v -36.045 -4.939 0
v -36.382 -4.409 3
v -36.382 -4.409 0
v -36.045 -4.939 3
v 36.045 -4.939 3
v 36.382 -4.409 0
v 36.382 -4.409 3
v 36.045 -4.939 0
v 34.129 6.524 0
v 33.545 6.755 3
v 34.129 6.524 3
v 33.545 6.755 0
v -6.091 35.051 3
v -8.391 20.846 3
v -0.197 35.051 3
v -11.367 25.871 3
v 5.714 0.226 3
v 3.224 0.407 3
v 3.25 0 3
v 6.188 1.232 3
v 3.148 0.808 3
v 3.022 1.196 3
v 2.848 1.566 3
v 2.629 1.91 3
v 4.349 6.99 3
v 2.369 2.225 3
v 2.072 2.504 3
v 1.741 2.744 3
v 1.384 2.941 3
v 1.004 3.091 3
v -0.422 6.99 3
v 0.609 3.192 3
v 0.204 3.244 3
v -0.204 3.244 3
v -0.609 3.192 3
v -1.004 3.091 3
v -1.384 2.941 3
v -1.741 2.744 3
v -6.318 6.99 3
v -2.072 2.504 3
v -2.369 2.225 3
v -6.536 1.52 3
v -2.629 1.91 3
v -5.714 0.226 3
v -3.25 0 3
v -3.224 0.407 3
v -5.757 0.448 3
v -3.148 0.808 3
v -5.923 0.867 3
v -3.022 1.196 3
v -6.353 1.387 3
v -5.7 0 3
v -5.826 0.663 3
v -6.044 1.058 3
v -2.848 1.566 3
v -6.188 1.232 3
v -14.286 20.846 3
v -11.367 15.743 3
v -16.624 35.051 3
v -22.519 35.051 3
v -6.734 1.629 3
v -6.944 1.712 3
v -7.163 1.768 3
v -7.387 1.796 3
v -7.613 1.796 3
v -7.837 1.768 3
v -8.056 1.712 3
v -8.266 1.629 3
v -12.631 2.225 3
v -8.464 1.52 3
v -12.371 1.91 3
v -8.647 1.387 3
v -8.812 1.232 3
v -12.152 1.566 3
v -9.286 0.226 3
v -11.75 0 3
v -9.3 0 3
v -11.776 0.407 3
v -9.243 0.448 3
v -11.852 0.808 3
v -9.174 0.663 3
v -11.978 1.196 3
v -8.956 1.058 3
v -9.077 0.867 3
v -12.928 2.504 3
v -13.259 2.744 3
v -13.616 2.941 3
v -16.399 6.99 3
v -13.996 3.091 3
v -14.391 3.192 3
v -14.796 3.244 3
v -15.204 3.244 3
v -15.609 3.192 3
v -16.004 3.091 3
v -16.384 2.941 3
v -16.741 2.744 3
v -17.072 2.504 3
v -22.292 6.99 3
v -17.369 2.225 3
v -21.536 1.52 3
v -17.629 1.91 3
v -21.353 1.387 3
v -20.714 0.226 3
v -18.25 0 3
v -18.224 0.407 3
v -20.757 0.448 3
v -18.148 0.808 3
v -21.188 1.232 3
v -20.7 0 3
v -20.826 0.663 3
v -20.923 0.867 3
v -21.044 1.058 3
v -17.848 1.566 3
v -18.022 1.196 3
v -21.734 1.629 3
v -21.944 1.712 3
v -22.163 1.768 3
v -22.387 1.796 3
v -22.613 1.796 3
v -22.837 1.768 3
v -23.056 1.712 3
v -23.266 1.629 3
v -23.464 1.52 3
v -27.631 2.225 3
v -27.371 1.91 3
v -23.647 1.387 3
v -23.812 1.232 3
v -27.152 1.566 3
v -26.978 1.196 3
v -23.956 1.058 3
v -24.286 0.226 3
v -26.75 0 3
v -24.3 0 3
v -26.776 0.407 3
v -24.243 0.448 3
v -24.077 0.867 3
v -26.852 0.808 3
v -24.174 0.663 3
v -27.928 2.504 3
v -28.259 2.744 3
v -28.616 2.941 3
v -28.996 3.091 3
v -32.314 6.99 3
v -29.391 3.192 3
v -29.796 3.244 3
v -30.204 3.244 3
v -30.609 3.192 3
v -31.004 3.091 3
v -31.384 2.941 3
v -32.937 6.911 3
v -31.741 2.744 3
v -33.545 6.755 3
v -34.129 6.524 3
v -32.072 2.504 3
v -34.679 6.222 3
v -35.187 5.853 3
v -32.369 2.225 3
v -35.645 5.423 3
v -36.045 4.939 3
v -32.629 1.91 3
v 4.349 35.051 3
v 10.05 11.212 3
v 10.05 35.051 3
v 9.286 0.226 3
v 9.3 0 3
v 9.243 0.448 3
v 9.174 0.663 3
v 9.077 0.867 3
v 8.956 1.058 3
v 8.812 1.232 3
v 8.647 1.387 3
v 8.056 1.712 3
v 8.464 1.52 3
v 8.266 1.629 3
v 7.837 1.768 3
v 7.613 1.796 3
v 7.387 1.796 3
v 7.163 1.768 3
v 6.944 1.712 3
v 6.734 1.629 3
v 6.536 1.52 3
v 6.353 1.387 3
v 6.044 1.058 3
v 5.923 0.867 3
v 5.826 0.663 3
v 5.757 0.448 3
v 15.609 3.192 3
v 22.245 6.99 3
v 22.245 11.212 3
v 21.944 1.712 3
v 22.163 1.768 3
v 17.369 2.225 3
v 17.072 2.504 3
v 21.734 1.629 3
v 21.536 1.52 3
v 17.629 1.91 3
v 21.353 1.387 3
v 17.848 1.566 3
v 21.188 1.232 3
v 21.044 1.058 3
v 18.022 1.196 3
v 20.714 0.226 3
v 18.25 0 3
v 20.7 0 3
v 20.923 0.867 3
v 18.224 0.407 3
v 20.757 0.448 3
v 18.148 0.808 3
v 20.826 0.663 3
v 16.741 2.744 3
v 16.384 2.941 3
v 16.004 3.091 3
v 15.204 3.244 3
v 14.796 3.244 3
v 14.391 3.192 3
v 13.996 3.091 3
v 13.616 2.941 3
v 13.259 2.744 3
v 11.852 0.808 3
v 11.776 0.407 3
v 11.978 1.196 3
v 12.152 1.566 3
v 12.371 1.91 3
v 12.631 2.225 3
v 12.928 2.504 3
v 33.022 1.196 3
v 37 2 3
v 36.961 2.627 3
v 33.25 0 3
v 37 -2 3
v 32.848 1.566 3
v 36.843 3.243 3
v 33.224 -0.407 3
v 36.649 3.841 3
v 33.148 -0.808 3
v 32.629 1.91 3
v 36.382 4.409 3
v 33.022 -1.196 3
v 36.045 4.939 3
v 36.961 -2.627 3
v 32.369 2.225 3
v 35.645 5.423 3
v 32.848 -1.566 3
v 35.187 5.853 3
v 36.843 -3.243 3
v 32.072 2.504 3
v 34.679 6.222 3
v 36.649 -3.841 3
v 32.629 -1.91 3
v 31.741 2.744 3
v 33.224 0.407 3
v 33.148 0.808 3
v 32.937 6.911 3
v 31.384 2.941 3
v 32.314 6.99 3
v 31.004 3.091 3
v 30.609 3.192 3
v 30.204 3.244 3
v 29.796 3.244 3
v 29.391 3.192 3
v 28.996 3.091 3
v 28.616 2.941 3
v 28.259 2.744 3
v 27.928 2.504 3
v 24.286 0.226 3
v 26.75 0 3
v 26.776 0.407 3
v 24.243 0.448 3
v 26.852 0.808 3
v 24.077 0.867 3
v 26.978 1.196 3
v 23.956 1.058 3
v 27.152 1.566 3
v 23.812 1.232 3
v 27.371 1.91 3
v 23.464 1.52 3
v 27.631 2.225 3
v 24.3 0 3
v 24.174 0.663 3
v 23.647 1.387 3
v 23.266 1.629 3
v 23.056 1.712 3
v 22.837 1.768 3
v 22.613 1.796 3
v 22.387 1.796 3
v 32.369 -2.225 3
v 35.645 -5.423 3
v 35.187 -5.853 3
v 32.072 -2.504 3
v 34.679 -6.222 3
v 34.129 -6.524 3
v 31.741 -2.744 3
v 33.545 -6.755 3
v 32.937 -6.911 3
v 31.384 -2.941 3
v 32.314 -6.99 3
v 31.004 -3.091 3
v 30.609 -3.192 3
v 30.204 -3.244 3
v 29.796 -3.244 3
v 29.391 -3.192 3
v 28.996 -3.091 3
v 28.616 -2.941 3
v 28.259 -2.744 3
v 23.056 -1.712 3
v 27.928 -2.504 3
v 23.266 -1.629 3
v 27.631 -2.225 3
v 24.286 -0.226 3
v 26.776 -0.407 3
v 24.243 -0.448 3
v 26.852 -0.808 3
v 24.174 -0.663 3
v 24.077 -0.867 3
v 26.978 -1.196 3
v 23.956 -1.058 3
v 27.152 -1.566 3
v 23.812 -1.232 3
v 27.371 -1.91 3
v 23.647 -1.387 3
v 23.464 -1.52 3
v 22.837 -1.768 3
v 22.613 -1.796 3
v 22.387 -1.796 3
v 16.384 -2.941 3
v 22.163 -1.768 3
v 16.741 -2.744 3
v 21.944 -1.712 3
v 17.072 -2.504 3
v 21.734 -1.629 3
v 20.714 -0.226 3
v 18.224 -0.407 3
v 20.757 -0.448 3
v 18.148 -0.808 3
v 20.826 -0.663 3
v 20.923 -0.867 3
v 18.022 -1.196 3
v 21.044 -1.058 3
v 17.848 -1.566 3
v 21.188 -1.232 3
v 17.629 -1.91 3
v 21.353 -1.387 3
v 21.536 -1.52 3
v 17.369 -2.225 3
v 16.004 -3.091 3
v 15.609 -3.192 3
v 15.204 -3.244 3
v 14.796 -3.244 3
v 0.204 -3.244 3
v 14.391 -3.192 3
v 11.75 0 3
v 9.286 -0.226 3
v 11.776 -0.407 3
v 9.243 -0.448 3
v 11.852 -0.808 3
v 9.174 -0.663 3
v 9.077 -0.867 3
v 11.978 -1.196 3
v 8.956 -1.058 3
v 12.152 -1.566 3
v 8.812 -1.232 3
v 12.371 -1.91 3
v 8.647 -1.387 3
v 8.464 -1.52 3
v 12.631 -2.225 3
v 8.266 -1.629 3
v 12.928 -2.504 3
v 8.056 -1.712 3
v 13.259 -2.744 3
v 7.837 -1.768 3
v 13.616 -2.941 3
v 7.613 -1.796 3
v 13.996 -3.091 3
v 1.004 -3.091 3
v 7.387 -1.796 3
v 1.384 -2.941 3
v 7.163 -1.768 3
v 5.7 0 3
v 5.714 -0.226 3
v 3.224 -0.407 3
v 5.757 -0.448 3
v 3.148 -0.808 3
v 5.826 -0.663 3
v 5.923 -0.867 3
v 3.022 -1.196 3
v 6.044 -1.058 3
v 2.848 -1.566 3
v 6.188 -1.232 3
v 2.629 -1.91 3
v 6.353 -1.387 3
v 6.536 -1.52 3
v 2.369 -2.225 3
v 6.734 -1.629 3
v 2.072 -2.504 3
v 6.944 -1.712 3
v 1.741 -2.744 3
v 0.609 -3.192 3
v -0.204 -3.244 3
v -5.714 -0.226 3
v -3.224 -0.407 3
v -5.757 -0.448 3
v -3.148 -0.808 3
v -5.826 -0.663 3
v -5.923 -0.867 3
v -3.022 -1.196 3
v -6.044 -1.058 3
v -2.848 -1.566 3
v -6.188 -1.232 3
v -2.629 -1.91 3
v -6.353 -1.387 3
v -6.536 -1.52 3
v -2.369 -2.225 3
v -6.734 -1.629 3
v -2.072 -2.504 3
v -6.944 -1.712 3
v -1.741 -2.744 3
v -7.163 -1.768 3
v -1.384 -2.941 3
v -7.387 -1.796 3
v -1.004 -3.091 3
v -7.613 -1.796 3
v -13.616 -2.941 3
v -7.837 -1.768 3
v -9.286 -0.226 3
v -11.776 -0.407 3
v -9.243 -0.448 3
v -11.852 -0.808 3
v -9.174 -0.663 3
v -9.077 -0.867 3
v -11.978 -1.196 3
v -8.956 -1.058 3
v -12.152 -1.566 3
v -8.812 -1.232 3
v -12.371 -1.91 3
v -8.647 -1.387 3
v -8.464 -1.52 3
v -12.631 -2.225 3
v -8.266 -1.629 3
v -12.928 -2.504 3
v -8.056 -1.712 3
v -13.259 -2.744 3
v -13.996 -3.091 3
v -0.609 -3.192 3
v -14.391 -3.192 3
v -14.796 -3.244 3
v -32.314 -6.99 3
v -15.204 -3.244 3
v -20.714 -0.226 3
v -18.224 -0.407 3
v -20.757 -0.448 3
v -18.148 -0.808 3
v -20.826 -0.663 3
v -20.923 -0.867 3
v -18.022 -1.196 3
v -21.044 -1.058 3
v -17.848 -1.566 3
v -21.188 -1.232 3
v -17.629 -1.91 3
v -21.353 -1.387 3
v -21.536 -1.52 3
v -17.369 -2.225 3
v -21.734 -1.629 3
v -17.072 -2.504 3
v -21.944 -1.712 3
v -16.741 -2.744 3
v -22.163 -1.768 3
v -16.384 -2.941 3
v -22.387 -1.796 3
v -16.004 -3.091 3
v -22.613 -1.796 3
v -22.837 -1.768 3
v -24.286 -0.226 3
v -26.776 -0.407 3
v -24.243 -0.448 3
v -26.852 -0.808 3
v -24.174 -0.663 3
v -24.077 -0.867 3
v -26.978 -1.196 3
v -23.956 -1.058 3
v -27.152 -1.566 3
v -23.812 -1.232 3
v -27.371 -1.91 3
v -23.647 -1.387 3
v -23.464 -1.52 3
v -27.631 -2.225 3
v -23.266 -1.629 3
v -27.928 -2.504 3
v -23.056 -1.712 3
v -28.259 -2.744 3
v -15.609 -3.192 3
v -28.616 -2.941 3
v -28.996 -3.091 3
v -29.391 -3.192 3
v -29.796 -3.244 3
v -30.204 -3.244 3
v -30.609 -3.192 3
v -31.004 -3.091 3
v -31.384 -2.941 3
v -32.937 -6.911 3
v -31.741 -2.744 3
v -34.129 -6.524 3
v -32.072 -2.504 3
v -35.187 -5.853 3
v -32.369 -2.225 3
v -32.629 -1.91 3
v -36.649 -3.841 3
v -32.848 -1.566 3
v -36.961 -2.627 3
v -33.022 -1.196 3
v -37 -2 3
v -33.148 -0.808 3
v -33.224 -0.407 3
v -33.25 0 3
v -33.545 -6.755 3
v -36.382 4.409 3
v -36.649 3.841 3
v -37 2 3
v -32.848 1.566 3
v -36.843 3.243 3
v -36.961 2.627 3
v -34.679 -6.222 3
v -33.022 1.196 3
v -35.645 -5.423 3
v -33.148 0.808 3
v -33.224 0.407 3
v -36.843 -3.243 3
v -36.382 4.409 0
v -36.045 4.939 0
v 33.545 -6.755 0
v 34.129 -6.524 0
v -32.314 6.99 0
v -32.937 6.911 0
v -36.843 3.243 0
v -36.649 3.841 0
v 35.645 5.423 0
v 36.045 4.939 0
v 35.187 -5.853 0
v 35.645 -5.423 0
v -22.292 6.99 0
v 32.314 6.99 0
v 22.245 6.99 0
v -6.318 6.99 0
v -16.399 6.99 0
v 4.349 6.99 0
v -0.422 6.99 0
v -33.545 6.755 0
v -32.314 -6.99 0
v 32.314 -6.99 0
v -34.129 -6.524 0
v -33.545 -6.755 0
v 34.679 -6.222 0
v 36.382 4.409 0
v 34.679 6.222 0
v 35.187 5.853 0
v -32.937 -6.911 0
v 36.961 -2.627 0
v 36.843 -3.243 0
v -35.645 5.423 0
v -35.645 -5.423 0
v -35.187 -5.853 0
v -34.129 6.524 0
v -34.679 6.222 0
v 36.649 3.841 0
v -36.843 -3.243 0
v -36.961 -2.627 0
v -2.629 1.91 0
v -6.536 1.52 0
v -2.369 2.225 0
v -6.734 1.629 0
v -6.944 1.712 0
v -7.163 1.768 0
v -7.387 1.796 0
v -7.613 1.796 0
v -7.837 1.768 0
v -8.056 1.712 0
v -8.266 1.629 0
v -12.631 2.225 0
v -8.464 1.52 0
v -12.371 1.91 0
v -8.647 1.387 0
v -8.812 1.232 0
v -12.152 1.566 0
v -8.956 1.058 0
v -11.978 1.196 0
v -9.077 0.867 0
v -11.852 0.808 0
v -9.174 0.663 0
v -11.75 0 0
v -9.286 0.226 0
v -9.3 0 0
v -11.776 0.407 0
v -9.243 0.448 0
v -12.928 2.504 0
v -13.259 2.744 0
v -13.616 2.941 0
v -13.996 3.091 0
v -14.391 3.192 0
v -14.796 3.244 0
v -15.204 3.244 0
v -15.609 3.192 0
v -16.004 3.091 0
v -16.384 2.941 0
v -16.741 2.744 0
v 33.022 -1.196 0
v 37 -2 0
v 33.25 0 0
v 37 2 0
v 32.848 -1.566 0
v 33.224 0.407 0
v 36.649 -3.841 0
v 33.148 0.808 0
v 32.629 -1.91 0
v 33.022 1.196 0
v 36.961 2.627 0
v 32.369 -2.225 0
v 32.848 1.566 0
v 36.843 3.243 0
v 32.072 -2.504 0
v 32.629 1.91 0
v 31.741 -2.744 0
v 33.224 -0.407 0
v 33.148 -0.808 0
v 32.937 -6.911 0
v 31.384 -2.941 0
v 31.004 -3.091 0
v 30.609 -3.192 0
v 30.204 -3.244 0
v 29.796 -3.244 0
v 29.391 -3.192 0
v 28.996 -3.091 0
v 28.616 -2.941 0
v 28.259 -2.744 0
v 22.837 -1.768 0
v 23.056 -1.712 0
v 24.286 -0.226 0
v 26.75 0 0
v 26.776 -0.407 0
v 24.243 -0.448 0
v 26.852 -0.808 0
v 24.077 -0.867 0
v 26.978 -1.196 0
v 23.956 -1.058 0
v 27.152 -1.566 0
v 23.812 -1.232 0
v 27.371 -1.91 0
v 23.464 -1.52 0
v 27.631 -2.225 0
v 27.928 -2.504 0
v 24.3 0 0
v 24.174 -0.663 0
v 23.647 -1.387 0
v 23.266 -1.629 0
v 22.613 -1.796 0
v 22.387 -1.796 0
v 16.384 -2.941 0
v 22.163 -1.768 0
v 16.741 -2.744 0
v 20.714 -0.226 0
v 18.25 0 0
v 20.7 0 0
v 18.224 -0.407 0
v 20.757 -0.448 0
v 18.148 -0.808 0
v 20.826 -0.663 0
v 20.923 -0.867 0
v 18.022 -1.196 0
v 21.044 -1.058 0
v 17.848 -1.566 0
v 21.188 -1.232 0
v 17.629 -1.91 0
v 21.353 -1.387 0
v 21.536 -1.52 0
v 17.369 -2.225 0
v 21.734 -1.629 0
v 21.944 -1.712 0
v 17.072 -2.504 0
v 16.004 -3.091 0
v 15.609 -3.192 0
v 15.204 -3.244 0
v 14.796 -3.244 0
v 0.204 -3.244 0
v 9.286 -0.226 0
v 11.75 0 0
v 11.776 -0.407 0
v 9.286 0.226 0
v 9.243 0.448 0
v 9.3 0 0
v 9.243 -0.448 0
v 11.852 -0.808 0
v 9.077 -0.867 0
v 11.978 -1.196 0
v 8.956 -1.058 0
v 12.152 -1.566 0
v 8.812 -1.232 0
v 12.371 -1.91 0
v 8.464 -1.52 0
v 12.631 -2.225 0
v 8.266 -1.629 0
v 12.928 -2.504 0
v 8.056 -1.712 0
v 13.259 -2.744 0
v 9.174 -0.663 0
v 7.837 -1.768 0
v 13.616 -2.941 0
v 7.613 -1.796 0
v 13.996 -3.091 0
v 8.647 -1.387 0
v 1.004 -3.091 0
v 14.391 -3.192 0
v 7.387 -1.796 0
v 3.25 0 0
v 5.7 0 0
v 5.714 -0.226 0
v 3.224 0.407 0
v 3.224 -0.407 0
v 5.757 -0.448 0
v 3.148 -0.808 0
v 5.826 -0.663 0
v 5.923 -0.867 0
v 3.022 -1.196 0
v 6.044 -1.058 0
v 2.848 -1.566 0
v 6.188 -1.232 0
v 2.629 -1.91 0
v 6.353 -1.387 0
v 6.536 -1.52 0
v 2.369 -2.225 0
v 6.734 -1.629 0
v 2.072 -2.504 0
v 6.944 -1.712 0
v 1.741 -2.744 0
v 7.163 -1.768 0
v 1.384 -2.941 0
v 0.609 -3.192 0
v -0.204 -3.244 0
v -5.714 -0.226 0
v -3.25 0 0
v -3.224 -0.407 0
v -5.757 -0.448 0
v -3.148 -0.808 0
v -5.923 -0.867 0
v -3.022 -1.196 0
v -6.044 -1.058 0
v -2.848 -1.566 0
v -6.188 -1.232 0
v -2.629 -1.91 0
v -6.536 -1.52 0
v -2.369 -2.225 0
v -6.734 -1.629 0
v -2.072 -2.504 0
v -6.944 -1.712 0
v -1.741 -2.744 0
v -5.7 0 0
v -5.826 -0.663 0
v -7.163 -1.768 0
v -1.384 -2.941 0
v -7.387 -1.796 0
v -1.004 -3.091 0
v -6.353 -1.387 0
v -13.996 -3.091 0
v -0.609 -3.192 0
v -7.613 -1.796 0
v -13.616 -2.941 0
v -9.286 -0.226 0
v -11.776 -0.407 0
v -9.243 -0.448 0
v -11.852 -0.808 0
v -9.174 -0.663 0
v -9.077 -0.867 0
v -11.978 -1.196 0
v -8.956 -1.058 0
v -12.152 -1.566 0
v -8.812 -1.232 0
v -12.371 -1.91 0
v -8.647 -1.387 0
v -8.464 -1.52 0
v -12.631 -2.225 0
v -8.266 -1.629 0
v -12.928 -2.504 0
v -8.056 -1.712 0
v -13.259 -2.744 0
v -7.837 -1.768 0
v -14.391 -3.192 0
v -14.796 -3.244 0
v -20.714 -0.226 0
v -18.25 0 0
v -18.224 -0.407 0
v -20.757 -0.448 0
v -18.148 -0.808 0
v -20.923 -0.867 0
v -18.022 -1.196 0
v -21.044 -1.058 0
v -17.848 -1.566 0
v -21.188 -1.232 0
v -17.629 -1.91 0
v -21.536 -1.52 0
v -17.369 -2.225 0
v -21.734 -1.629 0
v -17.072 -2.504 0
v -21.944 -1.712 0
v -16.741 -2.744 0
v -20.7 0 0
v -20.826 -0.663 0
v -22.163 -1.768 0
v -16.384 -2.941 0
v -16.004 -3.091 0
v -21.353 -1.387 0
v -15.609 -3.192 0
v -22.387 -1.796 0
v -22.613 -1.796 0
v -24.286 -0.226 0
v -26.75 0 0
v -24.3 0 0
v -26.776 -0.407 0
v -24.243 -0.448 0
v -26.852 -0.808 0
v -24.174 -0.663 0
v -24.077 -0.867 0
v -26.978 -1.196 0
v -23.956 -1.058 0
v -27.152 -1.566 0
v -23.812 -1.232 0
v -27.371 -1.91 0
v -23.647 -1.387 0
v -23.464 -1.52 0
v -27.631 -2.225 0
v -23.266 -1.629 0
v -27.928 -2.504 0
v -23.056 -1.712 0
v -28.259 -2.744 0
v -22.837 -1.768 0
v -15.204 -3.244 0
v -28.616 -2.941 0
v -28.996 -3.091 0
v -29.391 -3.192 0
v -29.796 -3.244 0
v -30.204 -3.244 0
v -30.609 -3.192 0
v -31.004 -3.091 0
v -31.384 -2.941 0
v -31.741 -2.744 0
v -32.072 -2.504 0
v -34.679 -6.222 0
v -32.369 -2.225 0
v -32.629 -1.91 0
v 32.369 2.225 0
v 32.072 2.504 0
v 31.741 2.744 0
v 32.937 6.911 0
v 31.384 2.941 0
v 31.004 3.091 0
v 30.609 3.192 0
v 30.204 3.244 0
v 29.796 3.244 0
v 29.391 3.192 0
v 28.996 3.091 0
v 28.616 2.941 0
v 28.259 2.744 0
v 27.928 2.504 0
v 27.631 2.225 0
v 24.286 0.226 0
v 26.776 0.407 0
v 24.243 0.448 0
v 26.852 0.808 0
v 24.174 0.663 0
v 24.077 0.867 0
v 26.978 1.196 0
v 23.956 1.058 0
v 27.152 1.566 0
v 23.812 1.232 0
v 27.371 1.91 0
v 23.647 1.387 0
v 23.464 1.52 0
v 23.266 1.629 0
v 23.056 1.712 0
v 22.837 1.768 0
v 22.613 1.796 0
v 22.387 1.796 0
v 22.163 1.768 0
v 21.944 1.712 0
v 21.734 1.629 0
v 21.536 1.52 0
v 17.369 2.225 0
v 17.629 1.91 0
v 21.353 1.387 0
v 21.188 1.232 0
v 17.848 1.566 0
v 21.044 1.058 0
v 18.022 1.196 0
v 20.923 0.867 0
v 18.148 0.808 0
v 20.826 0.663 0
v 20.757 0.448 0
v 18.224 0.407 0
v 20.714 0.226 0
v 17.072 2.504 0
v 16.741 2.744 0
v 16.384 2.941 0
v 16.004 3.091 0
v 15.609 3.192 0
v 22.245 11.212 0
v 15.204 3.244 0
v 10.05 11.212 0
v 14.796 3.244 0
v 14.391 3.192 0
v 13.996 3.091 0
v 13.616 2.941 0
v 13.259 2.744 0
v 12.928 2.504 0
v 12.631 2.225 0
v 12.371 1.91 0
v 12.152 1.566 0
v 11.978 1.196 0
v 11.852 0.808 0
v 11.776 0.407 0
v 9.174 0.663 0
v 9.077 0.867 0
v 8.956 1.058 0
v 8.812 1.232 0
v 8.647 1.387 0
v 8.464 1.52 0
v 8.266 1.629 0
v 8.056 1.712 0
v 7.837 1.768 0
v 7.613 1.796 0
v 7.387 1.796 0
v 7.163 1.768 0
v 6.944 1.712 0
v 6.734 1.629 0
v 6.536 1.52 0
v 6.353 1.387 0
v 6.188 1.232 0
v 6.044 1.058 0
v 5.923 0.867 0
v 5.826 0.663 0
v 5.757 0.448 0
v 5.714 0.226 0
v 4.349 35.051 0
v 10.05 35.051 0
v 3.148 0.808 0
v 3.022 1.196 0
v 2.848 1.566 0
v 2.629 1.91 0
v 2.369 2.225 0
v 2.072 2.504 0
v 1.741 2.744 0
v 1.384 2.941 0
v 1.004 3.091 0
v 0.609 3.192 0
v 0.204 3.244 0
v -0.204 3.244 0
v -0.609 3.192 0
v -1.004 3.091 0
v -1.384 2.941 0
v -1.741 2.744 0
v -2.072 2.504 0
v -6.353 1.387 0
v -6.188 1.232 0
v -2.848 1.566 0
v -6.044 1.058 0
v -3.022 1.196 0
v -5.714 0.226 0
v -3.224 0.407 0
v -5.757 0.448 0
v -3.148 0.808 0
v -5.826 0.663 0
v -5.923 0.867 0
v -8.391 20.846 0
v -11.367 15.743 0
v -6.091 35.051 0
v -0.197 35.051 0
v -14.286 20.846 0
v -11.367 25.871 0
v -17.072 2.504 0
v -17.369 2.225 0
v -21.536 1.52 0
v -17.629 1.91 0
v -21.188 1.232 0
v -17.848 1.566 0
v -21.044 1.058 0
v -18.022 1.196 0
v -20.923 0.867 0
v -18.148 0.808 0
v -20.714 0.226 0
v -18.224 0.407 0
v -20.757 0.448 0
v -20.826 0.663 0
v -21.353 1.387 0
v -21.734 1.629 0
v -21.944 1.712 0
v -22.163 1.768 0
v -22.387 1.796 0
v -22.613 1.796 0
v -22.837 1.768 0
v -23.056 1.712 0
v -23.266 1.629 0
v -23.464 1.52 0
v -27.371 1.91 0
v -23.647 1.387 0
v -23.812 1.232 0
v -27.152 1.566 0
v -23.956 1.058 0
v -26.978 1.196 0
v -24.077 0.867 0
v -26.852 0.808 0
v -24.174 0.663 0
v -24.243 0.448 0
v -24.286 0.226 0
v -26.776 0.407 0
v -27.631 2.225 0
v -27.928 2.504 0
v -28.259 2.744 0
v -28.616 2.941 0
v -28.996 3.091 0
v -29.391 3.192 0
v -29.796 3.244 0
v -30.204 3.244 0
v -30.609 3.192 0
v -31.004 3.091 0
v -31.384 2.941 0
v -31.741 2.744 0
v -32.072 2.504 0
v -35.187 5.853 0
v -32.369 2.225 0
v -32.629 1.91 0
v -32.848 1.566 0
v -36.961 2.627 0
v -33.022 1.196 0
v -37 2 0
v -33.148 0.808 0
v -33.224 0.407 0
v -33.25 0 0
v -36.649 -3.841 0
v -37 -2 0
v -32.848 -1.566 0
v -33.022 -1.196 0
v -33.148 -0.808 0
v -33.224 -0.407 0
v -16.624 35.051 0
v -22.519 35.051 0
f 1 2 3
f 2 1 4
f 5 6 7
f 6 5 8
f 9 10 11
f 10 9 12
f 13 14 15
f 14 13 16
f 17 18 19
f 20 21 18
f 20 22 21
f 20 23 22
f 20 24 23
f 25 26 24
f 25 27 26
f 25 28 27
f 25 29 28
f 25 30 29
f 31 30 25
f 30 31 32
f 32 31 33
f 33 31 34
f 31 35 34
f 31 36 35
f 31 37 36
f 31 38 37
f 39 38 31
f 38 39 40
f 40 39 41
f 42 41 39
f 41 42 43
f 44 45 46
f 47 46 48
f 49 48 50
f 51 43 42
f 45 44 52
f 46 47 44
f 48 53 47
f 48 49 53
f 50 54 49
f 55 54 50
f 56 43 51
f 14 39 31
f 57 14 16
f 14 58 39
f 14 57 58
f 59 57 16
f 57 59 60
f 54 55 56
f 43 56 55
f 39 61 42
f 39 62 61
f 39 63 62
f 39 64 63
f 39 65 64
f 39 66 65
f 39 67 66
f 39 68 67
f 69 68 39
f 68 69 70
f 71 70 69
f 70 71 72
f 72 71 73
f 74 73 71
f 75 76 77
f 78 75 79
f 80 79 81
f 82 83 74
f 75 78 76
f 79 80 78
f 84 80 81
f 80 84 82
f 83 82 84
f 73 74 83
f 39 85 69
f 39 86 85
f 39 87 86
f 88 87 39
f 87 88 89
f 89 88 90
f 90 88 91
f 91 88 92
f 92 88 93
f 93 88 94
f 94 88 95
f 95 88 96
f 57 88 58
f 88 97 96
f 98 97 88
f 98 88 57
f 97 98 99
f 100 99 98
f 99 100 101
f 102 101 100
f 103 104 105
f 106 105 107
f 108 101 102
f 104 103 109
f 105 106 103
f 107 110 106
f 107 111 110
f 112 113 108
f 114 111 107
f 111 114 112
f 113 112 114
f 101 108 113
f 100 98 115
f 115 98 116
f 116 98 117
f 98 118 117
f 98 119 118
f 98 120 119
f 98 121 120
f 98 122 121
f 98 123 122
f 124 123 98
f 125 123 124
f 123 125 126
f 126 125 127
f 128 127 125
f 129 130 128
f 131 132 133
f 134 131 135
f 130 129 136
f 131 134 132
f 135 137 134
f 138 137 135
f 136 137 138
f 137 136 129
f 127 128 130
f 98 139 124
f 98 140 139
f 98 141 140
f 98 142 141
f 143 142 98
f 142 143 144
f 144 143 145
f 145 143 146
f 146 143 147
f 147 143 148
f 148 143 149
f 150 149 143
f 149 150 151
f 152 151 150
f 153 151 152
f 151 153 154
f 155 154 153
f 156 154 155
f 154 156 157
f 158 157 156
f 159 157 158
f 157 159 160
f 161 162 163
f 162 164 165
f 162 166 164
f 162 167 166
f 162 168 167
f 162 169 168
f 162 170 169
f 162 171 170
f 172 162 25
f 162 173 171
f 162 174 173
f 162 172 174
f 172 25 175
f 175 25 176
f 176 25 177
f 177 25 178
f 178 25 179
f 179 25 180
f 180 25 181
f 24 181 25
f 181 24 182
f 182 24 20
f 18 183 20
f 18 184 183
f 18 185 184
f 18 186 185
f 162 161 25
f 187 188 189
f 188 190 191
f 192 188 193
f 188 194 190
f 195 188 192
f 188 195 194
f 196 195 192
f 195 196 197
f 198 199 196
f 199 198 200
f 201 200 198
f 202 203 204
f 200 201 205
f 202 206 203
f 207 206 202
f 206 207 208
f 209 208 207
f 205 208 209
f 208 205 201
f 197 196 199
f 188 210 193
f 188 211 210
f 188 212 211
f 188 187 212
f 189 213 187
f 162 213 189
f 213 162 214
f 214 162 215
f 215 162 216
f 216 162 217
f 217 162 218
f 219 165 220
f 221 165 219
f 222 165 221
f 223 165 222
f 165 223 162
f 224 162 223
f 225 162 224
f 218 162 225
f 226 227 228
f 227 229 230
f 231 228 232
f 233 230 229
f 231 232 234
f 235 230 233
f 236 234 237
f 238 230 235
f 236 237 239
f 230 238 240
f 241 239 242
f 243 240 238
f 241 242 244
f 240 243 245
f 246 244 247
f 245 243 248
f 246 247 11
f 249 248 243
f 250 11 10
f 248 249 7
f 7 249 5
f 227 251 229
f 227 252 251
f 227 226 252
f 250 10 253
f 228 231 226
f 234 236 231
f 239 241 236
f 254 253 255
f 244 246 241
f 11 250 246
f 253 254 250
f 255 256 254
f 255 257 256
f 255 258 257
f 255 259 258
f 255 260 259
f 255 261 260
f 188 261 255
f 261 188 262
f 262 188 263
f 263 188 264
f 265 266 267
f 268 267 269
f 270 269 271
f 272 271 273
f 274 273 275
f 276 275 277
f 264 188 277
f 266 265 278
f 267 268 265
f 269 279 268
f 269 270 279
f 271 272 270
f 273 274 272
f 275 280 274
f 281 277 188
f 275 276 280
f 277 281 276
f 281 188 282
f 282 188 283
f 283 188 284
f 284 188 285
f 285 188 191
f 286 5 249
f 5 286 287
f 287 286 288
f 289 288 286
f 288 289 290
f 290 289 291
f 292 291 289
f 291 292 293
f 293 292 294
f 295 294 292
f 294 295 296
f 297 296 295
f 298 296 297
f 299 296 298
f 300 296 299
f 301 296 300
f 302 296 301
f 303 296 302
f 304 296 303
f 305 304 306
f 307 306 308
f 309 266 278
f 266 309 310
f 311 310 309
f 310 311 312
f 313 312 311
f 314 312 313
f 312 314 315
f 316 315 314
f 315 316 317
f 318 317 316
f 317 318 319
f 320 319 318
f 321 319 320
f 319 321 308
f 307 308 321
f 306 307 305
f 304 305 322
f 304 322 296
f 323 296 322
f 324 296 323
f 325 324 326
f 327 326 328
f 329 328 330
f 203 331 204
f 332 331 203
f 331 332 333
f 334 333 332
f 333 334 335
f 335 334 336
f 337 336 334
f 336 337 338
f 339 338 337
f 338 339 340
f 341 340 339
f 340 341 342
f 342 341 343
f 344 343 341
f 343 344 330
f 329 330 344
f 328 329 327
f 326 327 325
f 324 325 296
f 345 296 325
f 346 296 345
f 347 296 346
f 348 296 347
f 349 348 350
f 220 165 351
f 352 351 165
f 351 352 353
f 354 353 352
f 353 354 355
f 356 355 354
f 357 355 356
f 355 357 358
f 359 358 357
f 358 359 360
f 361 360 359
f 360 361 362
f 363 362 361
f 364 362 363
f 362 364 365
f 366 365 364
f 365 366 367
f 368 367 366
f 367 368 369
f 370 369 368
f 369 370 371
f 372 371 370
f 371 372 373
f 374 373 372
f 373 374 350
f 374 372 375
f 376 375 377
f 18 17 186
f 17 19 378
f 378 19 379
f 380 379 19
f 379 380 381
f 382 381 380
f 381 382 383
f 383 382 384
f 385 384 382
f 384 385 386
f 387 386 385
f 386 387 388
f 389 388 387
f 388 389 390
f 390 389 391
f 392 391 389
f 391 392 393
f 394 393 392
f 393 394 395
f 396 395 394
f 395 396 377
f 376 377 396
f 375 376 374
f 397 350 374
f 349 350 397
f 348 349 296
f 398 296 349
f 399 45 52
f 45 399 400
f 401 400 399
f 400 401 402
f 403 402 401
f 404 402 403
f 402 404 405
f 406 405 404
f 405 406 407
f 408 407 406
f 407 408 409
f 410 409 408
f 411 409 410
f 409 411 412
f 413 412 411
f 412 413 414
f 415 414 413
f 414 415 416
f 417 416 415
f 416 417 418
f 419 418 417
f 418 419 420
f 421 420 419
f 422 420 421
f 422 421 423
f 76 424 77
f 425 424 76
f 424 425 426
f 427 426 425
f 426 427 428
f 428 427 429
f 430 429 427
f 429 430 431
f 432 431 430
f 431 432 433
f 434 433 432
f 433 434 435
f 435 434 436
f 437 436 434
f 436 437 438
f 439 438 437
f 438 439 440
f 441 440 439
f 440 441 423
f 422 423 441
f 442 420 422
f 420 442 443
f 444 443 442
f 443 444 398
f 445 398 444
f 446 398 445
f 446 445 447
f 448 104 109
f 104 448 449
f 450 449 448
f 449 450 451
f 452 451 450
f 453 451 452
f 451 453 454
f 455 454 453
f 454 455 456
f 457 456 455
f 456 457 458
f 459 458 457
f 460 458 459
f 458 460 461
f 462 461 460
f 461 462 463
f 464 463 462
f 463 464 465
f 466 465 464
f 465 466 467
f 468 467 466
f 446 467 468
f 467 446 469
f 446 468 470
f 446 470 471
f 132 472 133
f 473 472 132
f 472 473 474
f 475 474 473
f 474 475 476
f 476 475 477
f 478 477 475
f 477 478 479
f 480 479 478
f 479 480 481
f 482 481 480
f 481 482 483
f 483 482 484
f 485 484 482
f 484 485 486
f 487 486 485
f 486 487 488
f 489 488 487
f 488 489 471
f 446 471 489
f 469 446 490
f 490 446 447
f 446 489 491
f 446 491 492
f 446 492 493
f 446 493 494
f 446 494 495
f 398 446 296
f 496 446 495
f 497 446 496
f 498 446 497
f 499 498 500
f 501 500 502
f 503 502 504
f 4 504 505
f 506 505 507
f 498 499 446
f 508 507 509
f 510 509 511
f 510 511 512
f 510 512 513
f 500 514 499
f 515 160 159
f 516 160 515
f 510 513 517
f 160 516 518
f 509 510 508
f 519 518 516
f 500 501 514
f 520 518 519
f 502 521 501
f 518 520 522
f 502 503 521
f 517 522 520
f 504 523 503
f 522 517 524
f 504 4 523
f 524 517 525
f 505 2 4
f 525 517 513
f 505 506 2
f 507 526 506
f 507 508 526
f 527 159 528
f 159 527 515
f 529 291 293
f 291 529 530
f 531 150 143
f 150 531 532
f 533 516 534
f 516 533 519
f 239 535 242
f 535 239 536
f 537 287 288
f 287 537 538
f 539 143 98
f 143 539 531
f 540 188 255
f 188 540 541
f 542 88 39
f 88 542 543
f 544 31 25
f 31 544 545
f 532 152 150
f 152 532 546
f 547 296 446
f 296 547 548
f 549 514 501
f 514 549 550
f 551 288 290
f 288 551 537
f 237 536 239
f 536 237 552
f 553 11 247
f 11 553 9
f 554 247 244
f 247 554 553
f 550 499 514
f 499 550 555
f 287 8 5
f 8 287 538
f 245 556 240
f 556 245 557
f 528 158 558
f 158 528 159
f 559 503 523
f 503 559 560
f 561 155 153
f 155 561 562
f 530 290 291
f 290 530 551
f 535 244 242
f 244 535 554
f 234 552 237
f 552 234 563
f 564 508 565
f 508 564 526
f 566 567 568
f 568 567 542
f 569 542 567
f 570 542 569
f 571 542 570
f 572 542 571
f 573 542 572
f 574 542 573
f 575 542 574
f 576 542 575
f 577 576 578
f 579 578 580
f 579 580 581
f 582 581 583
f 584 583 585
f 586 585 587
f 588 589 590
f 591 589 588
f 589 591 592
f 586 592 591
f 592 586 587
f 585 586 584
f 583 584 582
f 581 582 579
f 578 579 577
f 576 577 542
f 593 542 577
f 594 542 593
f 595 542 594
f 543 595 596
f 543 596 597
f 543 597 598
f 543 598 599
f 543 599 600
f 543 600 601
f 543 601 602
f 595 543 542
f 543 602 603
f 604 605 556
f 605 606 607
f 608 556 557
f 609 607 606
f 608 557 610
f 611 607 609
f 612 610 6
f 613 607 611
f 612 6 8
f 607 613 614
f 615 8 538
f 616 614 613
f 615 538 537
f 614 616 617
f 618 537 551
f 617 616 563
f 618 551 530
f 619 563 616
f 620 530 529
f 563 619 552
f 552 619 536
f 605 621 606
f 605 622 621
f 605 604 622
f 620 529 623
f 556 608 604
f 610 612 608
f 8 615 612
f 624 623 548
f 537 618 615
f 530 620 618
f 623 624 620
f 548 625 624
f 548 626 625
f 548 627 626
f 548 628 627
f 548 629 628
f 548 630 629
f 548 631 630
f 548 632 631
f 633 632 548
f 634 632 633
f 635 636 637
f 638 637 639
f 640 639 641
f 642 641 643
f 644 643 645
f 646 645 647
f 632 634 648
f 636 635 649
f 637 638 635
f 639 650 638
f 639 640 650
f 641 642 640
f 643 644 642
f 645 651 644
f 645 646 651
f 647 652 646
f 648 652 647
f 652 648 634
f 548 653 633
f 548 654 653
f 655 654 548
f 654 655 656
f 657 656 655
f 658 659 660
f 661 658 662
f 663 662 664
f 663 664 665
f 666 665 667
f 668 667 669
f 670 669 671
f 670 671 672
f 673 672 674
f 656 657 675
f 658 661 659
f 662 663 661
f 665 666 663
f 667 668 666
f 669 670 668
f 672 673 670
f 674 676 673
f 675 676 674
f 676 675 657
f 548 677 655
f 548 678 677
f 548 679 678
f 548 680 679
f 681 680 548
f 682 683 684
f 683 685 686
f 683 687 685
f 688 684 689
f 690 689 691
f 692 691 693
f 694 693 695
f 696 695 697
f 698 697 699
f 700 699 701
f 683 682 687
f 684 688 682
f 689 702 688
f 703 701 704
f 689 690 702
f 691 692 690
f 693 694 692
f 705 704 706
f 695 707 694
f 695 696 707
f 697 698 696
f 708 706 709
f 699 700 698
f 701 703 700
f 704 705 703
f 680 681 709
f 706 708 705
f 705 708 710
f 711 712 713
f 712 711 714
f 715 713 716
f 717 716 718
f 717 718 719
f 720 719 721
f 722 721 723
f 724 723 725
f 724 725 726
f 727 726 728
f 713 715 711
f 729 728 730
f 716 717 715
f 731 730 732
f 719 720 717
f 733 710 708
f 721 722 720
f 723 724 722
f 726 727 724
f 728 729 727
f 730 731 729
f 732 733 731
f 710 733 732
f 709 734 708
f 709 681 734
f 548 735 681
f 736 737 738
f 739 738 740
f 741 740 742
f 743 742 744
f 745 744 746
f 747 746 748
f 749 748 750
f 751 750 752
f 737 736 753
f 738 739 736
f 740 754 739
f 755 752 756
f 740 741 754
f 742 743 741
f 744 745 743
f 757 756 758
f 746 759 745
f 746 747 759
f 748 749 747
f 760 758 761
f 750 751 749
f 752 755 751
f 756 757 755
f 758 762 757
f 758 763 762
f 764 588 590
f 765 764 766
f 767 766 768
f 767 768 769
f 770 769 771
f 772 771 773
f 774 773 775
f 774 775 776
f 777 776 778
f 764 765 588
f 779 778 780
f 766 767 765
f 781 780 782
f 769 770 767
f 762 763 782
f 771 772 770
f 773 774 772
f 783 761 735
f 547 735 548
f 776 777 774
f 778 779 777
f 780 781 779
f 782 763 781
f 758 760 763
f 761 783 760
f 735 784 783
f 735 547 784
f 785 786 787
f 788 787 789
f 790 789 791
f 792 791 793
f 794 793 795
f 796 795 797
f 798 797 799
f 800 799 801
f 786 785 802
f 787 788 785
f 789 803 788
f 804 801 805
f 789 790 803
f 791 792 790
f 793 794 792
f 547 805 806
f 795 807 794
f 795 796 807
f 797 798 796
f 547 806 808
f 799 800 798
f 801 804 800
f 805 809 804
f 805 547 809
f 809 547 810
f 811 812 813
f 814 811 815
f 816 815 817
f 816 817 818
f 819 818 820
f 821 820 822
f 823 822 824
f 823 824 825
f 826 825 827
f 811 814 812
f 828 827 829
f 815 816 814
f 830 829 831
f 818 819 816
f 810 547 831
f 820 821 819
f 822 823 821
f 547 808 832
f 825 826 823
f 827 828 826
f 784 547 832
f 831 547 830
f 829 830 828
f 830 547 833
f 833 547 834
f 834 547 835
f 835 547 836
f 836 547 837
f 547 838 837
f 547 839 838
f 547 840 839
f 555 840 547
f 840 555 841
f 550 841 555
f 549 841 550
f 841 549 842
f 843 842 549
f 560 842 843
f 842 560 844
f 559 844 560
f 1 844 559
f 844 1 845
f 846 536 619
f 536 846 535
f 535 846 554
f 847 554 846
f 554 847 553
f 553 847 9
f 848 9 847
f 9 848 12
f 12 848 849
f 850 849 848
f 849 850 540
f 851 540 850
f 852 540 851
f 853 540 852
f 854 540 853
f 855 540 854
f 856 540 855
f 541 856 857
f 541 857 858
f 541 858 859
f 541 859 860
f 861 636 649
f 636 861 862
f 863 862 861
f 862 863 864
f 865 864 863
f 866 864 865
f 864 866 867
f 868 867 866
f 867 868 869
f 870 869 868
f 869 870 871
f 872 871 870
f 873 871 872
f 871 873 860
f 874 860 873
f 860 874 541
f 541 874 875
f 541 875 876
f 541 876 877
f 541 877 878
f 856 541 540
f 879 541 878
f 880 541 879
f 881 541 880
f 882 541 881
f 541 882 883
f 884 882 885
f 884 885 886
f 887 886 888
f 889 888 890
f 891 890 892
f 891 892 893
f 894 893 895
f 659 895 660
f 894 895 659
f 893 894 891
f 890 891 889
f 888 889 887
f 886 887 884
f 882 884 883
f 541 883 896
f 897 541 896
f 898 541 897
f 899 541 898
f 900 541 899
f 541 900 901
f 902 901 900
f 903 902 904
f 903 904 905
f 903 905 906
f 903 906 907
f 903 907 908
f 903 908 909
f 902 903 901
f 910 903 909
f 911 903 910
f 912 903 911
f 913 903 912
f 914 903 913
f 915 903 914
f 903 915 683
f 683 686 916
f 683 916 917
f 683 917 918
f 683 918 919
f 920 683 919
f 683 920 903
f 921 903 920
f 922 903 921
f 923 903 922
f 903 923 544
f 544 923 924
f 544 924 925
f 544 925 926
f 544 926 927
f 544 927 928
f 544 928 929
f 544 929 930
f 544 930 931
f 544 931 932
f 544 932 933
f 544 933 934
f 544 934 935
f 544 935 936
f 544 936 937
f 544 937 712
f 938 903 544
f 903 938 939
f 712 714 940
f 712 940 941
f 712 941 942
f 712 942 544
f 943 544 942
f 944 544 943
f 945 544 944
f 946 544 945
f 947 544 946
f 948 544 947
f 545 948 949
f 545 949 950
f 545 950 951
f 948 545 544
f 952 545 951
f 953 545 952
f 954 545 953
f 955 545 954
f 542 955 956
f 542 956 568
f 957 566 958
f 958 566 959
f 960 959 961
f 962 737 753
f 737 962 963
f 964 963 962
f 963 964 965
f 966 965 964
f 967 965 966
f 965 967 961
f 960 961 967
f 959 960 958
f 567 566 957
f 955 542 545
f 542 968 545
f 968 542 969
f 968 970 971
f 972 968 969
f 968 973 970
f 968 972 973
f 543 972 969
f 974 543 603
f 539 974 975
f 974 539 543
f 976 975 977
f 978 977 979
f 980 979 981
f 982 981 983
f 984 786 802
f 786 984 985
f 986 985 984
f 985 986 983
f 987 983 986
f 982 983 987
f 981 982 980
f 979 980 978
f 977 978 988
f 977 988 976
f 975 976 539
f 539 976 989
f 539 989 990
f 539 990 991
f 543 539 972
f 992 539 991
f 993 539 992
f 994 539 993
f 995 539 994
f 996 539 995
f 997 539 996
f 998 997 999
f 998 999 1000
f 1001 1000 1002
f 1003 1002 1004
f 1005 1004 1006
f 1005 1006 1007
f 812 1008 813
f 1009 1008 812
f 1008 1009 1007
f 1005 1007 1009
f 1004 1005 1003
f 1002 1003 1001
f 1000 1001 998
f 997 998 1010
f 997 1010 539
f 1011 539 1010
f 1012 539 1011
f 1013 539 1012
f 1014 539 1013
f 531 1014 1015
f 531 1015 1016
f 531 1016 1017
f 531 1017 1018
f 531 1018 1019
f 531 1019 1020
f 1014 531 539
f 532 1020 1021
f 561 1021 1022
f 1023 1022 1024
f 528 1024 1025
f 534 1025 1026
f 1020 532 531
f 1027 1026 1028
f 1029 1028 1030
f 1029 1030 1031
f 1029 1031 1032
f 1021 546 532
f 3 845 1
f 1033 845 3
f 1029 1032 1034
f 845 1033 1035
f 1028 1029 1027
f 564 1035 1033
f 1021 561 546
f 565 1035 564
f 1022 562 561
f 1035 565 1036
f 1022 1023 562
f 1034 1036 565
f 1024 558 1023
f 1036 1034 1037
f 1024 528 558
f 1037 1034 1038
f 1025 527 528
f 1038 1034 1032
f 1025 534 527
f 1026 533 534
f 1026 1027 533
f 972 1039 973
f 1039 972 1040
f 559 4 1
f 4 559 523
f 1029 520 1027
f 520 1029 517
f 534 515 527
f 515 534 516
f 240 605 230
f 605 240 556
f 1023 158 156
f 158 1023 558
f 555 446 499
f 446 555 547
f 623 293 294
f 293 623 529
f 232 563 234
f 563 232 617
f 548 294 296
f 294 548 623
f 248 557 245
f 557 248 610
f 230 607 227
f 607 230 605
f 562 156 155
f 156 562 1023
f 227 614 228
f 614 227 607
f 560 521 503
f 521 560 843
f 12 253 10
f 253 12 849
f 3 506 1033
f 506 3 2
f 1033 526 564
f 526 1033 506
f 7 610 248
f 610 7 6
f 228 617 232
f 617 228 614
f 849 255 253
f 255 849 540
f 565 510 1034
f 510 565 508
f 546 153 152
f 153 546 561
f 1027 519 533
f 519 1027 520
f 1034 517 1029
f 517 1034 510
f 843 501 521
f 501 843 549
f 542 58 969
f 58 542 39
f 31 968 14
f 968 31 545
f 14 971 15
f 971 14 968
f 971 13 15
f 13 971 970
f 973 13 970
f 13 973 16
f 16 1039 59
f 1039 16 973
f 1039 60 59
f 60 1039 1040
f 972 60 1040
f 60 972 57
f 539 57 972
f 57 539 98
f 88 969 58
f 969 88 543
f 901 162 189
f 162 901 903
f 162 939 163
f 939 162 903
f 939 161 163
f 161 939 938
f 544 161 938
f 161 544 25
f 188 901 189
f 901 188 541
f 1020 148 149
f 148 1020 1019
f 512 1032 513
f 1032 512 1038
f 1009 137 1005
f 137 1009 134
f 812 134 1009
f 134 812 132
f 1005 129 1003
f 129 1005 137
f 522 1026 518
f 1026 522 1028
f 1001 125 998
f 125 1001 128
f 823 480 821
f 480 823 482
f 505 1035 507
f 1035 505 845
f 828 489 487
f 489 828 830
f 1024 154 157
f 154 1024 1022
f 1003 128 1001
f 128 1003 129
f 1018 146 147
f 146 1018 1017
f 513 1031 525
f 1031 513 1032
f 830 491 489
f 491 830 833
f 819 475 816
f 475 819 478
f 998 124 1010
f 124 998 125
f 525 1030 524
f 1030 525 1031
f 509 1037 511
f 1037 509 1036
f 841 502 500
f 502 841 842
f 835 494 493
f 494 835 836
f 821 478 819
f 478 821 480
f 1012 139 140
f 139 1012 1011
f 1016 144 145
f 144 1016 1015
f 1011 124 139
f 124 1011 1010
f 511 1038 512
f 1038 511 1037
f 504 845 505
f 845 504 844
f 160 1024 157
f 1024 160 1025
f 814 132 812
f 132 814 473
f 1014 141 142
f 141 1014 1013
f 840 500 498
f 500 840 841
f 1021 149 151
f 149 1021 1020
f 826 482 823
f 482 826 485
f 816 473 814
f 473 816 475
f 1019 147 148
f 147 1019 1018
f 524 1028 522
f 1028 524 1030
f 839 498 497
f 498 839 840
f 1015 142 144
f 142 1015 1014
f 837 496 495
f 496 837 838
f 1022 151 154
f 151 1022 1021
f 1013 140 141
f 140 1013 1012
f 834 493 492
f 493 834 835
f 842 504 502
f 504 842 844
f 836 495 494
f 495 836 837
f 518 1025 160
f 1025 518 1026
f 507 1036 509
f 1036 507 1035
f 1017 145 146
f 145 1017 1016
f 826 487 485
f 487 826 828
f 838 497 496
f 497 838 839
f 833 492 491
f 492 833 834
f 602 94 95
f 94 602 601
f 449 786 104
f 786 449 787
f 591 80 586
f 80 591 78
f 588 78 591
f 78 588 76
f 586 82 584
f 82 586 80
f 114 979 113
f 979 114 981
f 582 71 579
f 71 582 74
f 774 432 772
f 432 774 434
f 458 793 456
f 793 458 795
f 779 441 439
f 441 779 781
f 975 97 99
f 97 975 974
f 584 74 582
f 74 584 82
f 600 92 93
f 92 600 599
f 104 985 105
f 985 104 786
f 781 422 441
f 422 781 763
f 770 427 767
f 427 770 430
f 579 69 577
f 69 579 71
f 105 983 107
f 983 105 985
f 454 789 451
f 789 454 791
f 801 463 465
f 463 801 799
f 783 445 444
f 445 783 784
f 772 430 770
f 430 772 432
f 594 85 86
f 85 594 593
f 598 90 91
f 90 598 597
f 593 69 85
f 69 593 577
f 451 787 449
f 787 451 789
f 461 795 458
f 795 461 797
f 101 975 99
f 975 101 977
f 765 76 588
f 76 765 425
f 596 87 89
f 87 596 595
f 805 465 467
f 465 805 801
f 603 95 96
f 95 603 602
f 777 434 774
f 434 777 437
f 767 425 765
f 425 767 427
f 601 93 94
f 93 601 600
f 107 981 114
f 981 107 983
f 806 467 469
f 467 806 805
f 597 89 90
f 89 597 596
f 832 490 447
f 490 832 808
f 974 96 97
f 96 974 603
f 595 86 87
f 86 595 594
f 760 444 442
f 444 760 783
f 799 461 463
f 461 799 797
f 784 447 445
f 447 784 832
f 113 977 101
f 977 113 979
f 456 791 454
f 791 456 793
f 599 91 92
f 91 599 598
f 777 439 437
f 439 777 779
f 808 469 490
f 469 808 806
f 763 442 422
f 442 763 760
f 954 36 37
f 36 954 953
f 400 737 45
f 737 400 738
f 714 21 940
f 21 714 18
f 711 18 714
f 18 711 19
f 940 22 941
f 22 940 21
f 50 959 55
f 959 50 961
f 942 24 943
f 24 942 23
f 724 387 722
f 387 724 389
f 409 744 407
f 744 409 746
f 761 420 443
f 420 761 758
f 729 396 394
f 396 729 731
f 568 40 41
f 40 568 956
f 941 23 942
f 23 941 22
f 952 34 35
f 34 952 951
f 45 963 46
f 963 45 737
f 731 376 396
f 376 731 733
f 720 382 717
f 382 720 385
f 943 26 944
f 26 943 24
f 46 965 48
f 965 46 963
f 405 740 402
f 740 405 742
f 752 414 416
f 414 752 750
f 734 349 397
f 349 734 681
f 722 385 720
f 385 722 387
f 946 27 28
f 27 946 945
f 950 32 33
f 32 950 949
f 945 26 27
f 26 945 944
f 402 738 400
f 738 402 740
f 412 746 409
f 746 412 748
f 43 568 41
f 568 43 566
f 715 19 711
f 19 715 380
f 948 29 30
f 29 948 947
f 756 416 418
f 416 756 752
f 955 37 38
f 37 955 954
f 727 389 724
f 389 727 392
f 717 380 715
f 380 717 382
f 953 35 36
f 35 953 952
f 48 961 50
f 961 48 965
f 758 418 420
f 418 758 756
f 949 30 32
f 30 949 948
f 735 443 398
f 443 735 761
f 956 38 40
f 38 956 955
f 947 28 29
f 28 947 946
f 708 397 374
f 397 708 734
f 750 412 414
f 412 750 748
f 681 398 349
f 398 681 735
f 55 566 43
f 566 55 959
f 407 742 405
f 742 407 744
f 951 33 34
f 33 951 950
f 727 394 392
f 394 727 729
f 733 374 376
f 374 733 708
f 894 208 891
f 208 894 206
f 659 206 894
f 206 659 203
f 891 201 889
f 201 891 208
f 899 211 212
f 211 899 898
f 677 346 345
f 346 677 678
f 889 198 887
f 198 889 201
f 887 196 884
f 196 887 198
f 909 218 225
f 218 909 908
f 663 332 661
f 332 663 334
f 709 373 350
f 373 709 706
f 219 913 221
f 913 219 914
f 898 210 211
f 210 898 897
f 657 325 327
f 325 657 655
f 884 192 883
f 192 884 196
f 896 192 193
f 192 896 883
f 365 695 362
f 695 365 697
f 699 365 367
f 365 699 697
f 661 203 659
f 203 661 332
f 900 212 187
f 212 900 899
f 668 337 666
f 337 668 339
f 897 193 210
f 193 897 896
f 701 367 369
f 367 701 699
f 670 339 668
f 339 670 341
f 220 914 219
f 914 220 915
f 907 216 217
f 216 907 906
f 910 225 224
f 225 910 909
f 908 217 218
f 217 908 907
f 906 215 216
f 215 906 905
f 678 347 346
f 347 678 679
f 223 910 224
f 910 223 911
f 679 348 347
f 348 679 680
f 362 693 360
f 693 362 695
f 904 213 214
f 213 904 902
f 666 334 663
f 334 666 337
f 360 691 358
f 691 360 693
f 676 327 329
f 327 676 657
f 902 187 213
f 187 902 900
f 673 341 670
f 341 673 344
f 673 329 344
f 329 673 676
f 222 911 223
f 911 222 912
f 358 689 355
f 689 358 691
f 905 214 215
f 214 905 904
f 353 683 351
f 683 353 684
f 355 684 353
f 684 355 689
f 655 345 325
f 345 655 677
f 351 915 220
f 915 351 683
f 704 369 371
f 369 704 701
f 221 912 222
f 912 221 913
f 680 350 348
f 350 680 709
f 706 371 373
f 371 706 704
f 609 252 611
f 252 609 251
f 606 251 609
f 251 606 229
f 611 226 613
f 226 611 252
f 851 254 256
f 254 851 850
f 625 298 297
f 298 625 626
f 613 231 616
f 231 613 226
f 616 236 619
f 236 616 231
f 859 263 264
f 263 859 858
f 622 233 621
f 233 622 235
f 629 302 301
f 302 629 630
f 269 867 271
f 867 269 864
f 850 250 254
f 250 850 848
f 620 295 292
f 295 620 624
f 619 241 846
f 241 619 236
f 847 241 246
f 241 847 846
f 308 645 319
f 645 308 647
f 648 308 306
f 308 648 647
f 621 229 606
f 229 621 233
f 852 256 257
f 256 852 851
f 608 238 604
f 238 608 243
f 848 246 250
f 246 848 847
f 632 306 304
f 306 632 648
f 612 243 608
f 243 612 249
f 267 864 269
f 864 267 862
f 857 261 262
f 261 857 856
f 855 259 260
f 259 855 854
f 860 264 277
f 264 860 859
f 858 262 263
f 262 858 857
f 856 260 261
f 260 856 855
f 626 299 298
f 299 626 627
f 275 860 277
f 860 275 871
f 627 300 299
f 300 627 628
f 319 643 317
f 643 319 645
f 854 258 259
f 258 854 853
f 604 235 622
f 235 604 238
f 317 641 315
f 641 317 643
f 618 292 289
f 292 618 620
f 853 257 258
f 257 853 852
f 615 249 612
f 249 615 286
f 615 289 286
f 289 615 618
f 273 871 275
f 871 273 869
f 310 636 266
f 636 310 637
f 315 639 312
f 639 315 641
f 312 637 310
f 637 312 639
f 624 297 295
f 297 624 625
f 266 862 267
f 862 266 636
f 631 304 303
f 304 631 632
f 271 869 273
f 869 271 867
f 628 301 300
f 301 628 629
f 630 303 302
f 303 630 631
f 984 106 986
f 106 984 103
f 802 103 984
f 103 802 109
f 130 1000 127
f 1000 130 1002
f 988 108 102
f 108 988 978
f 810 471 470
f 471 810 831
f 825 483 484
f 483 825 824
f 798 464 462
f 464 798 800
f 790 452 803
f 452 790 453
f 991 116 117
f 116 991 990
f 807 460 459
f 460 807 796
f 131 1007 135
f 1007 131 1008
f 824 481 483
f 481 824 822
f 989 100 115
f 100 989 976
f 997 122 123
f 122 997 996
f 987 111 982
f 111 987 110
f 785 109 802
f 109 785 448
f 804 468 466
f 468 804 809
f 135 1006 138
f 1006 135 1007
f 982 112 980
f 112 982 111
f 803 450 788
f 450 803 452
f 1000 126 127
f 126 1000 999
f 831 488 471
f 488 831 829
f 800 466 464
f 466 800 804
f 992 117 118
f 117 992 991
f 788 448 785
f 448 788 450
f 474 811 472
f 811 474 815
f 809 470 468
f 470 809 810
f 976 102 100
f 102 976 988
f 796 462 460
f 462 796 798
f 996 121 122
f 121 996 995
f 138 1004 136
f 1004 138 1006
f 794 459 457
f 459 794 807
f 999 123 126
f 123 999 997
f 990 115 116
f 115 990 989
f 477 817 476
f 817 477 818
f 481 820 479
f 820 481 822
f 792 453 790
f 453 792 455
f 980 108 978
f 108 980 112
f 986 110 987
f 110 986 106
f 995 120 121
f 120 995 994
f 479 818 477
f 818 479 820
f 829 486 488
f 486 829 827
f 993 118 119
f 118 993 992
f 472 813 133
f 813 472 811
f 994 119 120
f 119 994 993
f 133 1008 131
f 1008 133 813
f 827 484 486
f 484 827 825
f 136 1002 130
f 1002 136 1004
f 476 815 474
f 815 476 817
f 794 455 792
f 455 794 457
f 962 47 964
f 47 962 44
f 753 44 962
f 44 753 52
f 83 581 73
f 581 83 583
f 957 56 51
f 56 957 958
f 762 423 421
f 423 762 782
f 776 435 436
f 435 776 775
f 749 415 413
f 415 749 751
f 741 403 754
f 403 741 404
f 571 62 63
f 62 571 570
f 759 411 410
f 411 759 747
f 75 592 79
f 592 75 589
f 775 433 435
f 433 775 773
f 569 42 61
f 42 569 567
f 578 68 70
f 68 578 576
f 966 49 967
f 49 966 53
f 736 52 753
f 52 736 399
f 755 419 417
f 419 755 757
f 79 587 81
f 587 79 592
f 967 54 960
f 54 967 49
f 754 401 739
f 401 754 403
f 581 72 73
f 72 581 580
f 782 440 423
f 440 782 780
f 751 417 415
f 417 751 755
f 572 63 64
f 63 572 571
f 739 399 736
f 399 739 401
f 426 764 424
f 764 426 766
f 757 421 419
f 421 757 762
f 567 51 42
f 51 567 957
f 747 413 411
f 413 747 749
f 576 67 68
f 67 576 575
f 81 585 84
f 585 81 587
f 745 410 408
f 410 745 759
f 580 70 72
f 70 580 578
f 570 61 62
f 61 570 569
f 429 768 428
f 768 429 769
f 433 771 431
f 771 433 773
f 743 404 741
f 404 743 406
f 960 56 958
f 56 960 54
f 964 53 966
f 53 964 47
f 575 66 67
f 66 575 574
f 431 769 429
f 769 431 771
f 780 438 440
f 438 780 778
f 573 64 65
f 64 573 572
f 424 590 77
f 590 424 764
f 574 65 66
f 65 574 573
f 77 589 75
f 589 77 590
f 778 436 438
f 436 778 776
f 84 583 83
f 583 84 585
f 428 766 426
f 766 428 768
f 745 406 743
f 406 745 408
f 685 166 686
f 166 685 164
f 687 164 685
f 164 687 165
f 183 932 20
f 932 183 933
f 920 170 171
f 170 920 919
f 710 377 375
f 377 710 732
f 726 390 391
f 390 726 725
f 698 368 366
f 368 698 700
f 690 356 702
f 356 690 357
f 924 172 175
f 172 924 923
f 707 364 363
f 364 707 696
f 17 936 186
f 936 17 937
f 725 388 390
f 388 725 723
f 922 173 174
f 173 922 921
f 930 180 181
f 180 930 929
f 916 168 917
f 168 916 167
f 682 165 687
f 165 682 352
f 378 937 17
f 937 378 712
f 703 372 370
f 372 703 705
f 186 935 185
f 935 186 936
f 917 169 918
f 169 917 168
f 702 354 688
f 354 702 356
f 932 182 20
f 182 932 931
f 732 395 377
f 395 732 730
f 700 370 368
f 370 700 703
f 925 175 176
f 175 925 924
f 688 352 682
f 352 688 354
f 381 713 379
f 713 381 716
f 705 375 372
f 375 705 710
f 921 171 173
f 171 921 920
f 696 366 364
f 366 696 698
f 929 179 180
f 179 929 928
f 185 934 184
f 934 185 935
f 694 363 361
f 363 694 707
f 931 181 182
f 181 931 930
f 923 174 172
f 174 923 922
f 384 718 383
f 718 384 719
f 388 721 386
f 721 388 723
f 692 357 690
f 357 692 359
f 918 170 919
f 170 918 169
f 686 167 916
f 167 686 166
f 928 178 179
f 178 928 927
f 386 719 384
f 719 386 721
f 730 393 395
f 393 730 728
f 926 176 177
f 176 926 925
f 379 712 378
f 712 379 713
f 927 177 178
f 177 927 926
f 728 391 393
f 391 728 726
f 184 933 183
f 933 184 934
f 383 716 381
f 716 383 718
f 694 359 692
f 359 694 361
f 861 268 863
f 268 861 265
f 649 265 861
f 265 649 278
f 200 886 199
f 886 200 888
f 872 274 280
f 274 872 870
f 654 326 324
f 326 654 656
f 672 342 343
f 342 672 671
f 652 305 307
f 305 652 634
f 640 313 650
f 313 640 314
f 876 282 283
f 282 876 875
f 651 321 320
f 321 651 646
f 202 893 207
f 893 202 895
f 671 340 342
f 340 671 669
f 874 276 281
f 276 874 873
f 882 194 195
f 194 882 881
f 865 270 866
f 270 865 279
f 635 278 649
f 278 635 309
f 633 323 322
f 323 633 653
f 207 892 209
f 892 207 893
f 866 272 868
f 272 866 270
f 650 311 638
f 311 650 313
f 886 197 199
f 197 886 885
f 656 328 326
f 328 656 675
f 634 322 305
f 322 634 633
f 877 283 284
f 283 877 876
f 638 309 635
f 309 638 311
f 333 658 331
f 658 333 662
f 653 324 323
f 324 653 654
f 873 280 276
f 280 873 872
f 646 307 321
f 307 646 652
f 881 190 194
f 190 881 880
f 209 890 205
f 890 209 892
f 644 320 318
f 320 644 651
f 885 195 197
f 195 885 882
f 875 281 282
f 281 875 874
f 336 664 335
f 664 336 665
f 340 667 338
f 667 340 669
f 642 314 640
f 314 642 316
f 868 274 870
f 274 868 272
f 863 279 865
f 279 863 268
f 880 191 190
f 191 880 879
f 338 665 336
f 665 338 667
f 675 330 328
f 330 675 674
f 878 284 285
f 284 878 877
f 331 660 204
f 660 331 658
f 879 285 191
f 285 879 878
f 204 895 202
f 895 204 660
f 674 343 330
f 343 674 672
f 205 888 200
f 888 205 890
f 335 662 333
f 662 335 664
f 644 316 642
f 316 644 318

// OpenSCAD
$fn = 50;


difference() {
	union() {
		hull() {
			translate(v = [-32.0000000000, 2.0000000000, 0]) {
				cylinder(h = 3, r = 5);
			}
			translate(v = [32.0000000000, 2.0000000000, 0]) {
				cylinder(h = 3, r = 5);
			}
			translate(v = [-32.0000000000, -2.0000000000, 0]) {
				cylinder(h = 3, r = 5);
			}
			translate(v = [32.0000000000, -2.0000000000, 0]) {
				cylinder(h = 3, r = 5);
			}
		}
		translate(v = [0, 34.3750000000, 0]) {
			linear_extrude(height = 3) {
				text(font = "DejaVu Sans Mono:style=Bold", halign = "center", size = 28.5000000000, text = "XL", valign = "top");
			}
		}
	}
	union() {
		translate(v = [-30.0000000000, 0.0000000000, 0]) {
			translate(v = [0, 0, -100]) {
				cylinder(h = 200, r = 3.2500000000);
			}
		}
		translate(v = [-15.0000000000, 0.0000000000, 0]) {
			translate(v = [0, 0, -100]) {
				cylinder(h = 200, r = 3.2500000000);
			}
		}
		translate(v = [0, 0, -100]) {
			cylinder(h = 200, r = 3.2500000000);
		}
		translate(v = [15.0000000000, 0.0000000000, 0]) {
			translate(v = [0, 0, -100]) {
				cylinder(h = 200, r = 3.2500000000);
			}
		}
		translate(v = [30.0000000000, 0.0000000000, 0]) {
			translate(v = [0, 0, -100]) {
				cylinder(h = 200, r = 3.2500000000);
			}
		}
		translate(v = [-30.0000000000, 0.0000000000, 0]) {
			translate(v = [0, 0, -100]) {
				cylinder(h = 200, r = 1.8000000000);
			}
		}
		translate(v = [-22.5000000000, 0.0000000000, 0]) {
			translate(v = [0, 0, -100]) {
				cylinder(h = 200, r = 1.8000000000);
			}
		}
		translate(v = [-15.0000000000, 0.0000000000, 0]) {
			translate(v = [0, 0, -100]) {
				cylinder(h = 200, r = 1.8000000000);
			}
		}
		translate(v = [-7.5000000000, 0.0000000000, 0]) {
			translate(v = [0, 0, -100]) {
				cylinder(h = 200, r = 1.8000000000);
			}
		}
		translate(v = [0, 0, -100]) {
			cylinder(h = 200, r = 1.8000000000);
		}
		translate(v = [7.5000000000, 0.0000000000, 0]) {
			translate(v = [0, 0, -100]) {
				cylinder(h = 200, r = 1.8000000000);
			}
		}
		translate(v = [15.0000000000, 0.0000000000, 0]) {
			translate(v = [0, 0, -100]) {
				cylinder(h = 200, r = 1.8000000000);
			}
		}
		translate(v = [22.5000000000, 0.0000000000, 0]) {
			translate(v = [0, 0, -100]) {
				cylinder(h = 200, r = 1.8000000000);
			}
		}
		translate(v = [30.0000000000, 0.0000000000, 0]) {
			translate(v = [0, 0, -100]) {
				cylinder(h = 200, r = 1.8000000000);
			}
		}
	}
}
